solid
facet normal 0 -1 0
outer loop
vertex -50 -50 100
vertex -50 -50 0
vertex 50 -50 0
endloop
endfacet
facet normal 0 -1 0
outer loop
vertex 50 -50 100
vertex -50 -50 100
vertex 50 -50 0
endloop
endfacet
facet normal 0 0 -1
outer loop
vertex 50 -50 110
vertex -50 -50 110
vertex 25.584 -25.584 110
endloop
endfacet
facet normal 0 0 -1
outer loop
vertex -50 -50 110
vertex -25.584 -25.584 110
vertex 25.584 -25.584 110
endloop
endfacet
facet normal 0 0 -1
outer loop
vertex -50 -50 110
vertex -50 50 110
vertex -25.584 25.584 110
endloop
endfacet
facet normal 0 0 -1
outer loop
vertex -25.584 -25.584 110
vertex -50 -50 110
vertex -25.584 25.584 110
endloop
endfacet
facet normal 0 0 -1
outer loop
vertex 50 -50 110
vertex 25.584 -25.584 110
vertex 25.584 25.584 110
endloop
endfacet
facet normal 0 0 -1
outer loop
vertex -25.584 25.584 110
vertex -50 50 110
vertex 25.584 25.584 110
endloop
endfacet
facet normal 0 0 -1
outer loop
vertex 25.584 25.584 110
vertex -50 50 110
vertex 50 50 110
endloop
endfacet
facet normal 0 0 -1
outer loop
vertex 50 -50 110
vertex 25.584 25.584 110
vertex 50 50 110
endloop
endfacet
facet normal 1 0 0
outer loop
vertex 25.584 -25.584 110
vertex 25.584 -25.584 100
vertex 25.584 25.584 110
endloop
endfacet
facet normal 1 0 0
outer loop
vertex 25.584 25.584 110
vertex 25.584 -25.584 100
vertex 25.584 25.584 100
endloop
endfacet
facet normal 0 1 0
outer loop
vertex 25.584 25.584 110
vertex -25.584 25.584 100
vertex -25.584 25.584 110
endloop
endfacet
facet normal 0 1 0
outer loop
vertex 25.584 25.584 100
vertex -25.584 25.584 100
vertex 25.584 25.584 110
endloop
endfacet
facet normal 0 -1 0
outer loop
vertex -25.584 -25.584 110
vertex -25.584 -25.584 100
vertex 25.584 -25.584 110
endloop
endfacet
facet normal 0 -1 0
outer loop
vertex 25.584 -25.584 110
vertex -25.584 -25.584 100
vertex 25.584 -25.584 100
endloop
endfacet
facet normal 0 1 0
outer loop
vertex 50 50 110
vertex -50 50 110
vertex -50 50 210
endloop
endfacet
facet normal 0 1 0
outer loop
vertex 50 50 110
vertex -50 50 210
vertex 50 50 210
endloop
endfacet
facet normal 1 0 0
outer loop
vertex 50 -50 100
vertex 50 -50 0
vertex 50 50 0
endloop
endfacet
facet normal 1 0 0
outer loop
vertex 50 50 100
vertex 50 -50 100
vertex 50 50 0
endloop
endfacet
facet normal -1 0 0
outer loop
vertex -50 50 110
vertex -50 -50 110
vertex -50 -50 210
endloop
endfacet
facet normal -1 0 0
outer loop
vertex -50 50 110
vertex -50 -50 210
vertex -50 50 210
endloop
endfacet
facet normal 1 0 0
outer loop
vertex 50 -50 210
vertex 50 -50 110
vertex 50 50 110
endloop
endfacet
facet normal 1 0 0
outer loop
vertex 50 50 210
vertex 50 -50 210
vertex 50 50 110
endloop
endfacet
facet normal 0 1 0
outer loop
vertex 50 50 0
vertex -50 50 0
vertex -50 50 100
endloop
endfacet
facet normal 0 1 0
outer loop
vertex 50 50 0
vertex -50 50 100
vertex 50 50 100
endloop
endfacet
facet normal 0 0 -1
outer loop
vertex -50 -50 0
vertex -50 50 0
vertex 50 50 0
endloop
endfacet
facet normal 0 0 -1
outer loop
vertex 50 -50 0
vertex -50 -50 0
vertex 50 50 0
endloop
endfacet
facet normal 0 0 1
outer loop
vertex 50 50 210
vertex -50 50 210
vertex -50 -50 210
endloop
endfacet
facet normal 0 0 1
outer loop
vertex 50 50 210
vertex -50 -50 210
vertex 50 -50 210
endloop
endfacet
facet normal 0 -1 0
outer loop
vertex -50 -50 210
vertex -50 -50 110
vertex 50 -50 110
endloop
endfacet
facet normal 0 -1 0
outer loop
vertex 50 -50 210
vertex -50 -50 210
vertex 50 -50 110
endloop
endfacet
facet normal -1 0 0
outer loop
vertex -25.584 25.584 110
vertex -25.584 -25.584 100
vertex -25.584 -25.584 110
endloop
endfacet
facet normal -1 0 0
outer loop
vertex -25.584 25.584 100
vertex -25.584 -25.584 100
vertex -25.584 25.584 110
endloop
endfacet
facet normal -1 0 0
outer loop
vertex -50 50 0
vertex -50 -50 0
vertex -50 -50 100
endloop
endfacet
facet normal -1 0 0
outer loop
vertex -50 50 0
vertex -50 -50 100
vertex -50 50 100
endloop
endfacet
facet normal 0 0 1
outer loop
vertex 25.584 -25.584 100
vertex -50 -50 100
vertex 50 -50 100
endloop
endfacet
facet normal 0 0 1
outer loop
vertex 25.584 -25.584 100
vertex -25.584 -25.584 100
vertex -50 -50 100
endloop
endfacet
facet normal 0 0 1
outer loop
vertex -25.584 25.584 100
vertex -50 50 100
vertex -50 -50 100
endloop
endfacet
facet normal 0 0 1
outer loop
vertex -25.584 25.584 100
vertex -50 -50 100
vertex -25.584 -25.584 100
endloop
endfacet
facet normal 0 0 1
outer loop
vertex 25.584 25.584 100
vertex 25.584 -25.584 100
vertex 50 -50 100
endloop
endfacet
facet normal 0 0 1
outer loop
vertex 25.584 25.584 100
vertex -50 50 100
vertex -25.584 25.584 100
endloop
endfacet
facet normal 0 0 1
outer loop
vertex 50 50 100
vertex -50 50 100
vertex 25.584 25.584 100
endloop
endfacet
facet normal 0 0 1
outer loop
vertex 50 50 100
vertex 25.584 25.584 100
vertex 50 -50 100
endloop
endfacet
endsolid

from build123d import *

# Parameters (mm, degrees)
F0_W     = 100
F0_H     = 100
F1_DEPTH = 100
F2_W     = 51.167542
F2_H     = 51.167542
F3_DEPTH = 10
F4_W     = 100
F4_H     = 100
F5_DEPTH = 100


with BuildPart() as f1:
    # F0 (on Top) → F1 (new body)
    with BuildSketch(Plane.XY):
        Rectangle(F0_W, F0_H)
    extrude(amount=F1_DEPTH)

    # F2 (on face) → F3 (join)
    with BuildSketch(Plane.XY.offset(100)):
        Rectangle(F2_W, F2_H)
    extrude(amount=F3_DEPTH)

    # F4 (on face) → F5 (join)
    with BuildSketch(Plane.XY.offset(110)):
        Rectangle(F4_W, F4_H)
    extrude(amount=F5_DEPTH)


solid = f1.part
